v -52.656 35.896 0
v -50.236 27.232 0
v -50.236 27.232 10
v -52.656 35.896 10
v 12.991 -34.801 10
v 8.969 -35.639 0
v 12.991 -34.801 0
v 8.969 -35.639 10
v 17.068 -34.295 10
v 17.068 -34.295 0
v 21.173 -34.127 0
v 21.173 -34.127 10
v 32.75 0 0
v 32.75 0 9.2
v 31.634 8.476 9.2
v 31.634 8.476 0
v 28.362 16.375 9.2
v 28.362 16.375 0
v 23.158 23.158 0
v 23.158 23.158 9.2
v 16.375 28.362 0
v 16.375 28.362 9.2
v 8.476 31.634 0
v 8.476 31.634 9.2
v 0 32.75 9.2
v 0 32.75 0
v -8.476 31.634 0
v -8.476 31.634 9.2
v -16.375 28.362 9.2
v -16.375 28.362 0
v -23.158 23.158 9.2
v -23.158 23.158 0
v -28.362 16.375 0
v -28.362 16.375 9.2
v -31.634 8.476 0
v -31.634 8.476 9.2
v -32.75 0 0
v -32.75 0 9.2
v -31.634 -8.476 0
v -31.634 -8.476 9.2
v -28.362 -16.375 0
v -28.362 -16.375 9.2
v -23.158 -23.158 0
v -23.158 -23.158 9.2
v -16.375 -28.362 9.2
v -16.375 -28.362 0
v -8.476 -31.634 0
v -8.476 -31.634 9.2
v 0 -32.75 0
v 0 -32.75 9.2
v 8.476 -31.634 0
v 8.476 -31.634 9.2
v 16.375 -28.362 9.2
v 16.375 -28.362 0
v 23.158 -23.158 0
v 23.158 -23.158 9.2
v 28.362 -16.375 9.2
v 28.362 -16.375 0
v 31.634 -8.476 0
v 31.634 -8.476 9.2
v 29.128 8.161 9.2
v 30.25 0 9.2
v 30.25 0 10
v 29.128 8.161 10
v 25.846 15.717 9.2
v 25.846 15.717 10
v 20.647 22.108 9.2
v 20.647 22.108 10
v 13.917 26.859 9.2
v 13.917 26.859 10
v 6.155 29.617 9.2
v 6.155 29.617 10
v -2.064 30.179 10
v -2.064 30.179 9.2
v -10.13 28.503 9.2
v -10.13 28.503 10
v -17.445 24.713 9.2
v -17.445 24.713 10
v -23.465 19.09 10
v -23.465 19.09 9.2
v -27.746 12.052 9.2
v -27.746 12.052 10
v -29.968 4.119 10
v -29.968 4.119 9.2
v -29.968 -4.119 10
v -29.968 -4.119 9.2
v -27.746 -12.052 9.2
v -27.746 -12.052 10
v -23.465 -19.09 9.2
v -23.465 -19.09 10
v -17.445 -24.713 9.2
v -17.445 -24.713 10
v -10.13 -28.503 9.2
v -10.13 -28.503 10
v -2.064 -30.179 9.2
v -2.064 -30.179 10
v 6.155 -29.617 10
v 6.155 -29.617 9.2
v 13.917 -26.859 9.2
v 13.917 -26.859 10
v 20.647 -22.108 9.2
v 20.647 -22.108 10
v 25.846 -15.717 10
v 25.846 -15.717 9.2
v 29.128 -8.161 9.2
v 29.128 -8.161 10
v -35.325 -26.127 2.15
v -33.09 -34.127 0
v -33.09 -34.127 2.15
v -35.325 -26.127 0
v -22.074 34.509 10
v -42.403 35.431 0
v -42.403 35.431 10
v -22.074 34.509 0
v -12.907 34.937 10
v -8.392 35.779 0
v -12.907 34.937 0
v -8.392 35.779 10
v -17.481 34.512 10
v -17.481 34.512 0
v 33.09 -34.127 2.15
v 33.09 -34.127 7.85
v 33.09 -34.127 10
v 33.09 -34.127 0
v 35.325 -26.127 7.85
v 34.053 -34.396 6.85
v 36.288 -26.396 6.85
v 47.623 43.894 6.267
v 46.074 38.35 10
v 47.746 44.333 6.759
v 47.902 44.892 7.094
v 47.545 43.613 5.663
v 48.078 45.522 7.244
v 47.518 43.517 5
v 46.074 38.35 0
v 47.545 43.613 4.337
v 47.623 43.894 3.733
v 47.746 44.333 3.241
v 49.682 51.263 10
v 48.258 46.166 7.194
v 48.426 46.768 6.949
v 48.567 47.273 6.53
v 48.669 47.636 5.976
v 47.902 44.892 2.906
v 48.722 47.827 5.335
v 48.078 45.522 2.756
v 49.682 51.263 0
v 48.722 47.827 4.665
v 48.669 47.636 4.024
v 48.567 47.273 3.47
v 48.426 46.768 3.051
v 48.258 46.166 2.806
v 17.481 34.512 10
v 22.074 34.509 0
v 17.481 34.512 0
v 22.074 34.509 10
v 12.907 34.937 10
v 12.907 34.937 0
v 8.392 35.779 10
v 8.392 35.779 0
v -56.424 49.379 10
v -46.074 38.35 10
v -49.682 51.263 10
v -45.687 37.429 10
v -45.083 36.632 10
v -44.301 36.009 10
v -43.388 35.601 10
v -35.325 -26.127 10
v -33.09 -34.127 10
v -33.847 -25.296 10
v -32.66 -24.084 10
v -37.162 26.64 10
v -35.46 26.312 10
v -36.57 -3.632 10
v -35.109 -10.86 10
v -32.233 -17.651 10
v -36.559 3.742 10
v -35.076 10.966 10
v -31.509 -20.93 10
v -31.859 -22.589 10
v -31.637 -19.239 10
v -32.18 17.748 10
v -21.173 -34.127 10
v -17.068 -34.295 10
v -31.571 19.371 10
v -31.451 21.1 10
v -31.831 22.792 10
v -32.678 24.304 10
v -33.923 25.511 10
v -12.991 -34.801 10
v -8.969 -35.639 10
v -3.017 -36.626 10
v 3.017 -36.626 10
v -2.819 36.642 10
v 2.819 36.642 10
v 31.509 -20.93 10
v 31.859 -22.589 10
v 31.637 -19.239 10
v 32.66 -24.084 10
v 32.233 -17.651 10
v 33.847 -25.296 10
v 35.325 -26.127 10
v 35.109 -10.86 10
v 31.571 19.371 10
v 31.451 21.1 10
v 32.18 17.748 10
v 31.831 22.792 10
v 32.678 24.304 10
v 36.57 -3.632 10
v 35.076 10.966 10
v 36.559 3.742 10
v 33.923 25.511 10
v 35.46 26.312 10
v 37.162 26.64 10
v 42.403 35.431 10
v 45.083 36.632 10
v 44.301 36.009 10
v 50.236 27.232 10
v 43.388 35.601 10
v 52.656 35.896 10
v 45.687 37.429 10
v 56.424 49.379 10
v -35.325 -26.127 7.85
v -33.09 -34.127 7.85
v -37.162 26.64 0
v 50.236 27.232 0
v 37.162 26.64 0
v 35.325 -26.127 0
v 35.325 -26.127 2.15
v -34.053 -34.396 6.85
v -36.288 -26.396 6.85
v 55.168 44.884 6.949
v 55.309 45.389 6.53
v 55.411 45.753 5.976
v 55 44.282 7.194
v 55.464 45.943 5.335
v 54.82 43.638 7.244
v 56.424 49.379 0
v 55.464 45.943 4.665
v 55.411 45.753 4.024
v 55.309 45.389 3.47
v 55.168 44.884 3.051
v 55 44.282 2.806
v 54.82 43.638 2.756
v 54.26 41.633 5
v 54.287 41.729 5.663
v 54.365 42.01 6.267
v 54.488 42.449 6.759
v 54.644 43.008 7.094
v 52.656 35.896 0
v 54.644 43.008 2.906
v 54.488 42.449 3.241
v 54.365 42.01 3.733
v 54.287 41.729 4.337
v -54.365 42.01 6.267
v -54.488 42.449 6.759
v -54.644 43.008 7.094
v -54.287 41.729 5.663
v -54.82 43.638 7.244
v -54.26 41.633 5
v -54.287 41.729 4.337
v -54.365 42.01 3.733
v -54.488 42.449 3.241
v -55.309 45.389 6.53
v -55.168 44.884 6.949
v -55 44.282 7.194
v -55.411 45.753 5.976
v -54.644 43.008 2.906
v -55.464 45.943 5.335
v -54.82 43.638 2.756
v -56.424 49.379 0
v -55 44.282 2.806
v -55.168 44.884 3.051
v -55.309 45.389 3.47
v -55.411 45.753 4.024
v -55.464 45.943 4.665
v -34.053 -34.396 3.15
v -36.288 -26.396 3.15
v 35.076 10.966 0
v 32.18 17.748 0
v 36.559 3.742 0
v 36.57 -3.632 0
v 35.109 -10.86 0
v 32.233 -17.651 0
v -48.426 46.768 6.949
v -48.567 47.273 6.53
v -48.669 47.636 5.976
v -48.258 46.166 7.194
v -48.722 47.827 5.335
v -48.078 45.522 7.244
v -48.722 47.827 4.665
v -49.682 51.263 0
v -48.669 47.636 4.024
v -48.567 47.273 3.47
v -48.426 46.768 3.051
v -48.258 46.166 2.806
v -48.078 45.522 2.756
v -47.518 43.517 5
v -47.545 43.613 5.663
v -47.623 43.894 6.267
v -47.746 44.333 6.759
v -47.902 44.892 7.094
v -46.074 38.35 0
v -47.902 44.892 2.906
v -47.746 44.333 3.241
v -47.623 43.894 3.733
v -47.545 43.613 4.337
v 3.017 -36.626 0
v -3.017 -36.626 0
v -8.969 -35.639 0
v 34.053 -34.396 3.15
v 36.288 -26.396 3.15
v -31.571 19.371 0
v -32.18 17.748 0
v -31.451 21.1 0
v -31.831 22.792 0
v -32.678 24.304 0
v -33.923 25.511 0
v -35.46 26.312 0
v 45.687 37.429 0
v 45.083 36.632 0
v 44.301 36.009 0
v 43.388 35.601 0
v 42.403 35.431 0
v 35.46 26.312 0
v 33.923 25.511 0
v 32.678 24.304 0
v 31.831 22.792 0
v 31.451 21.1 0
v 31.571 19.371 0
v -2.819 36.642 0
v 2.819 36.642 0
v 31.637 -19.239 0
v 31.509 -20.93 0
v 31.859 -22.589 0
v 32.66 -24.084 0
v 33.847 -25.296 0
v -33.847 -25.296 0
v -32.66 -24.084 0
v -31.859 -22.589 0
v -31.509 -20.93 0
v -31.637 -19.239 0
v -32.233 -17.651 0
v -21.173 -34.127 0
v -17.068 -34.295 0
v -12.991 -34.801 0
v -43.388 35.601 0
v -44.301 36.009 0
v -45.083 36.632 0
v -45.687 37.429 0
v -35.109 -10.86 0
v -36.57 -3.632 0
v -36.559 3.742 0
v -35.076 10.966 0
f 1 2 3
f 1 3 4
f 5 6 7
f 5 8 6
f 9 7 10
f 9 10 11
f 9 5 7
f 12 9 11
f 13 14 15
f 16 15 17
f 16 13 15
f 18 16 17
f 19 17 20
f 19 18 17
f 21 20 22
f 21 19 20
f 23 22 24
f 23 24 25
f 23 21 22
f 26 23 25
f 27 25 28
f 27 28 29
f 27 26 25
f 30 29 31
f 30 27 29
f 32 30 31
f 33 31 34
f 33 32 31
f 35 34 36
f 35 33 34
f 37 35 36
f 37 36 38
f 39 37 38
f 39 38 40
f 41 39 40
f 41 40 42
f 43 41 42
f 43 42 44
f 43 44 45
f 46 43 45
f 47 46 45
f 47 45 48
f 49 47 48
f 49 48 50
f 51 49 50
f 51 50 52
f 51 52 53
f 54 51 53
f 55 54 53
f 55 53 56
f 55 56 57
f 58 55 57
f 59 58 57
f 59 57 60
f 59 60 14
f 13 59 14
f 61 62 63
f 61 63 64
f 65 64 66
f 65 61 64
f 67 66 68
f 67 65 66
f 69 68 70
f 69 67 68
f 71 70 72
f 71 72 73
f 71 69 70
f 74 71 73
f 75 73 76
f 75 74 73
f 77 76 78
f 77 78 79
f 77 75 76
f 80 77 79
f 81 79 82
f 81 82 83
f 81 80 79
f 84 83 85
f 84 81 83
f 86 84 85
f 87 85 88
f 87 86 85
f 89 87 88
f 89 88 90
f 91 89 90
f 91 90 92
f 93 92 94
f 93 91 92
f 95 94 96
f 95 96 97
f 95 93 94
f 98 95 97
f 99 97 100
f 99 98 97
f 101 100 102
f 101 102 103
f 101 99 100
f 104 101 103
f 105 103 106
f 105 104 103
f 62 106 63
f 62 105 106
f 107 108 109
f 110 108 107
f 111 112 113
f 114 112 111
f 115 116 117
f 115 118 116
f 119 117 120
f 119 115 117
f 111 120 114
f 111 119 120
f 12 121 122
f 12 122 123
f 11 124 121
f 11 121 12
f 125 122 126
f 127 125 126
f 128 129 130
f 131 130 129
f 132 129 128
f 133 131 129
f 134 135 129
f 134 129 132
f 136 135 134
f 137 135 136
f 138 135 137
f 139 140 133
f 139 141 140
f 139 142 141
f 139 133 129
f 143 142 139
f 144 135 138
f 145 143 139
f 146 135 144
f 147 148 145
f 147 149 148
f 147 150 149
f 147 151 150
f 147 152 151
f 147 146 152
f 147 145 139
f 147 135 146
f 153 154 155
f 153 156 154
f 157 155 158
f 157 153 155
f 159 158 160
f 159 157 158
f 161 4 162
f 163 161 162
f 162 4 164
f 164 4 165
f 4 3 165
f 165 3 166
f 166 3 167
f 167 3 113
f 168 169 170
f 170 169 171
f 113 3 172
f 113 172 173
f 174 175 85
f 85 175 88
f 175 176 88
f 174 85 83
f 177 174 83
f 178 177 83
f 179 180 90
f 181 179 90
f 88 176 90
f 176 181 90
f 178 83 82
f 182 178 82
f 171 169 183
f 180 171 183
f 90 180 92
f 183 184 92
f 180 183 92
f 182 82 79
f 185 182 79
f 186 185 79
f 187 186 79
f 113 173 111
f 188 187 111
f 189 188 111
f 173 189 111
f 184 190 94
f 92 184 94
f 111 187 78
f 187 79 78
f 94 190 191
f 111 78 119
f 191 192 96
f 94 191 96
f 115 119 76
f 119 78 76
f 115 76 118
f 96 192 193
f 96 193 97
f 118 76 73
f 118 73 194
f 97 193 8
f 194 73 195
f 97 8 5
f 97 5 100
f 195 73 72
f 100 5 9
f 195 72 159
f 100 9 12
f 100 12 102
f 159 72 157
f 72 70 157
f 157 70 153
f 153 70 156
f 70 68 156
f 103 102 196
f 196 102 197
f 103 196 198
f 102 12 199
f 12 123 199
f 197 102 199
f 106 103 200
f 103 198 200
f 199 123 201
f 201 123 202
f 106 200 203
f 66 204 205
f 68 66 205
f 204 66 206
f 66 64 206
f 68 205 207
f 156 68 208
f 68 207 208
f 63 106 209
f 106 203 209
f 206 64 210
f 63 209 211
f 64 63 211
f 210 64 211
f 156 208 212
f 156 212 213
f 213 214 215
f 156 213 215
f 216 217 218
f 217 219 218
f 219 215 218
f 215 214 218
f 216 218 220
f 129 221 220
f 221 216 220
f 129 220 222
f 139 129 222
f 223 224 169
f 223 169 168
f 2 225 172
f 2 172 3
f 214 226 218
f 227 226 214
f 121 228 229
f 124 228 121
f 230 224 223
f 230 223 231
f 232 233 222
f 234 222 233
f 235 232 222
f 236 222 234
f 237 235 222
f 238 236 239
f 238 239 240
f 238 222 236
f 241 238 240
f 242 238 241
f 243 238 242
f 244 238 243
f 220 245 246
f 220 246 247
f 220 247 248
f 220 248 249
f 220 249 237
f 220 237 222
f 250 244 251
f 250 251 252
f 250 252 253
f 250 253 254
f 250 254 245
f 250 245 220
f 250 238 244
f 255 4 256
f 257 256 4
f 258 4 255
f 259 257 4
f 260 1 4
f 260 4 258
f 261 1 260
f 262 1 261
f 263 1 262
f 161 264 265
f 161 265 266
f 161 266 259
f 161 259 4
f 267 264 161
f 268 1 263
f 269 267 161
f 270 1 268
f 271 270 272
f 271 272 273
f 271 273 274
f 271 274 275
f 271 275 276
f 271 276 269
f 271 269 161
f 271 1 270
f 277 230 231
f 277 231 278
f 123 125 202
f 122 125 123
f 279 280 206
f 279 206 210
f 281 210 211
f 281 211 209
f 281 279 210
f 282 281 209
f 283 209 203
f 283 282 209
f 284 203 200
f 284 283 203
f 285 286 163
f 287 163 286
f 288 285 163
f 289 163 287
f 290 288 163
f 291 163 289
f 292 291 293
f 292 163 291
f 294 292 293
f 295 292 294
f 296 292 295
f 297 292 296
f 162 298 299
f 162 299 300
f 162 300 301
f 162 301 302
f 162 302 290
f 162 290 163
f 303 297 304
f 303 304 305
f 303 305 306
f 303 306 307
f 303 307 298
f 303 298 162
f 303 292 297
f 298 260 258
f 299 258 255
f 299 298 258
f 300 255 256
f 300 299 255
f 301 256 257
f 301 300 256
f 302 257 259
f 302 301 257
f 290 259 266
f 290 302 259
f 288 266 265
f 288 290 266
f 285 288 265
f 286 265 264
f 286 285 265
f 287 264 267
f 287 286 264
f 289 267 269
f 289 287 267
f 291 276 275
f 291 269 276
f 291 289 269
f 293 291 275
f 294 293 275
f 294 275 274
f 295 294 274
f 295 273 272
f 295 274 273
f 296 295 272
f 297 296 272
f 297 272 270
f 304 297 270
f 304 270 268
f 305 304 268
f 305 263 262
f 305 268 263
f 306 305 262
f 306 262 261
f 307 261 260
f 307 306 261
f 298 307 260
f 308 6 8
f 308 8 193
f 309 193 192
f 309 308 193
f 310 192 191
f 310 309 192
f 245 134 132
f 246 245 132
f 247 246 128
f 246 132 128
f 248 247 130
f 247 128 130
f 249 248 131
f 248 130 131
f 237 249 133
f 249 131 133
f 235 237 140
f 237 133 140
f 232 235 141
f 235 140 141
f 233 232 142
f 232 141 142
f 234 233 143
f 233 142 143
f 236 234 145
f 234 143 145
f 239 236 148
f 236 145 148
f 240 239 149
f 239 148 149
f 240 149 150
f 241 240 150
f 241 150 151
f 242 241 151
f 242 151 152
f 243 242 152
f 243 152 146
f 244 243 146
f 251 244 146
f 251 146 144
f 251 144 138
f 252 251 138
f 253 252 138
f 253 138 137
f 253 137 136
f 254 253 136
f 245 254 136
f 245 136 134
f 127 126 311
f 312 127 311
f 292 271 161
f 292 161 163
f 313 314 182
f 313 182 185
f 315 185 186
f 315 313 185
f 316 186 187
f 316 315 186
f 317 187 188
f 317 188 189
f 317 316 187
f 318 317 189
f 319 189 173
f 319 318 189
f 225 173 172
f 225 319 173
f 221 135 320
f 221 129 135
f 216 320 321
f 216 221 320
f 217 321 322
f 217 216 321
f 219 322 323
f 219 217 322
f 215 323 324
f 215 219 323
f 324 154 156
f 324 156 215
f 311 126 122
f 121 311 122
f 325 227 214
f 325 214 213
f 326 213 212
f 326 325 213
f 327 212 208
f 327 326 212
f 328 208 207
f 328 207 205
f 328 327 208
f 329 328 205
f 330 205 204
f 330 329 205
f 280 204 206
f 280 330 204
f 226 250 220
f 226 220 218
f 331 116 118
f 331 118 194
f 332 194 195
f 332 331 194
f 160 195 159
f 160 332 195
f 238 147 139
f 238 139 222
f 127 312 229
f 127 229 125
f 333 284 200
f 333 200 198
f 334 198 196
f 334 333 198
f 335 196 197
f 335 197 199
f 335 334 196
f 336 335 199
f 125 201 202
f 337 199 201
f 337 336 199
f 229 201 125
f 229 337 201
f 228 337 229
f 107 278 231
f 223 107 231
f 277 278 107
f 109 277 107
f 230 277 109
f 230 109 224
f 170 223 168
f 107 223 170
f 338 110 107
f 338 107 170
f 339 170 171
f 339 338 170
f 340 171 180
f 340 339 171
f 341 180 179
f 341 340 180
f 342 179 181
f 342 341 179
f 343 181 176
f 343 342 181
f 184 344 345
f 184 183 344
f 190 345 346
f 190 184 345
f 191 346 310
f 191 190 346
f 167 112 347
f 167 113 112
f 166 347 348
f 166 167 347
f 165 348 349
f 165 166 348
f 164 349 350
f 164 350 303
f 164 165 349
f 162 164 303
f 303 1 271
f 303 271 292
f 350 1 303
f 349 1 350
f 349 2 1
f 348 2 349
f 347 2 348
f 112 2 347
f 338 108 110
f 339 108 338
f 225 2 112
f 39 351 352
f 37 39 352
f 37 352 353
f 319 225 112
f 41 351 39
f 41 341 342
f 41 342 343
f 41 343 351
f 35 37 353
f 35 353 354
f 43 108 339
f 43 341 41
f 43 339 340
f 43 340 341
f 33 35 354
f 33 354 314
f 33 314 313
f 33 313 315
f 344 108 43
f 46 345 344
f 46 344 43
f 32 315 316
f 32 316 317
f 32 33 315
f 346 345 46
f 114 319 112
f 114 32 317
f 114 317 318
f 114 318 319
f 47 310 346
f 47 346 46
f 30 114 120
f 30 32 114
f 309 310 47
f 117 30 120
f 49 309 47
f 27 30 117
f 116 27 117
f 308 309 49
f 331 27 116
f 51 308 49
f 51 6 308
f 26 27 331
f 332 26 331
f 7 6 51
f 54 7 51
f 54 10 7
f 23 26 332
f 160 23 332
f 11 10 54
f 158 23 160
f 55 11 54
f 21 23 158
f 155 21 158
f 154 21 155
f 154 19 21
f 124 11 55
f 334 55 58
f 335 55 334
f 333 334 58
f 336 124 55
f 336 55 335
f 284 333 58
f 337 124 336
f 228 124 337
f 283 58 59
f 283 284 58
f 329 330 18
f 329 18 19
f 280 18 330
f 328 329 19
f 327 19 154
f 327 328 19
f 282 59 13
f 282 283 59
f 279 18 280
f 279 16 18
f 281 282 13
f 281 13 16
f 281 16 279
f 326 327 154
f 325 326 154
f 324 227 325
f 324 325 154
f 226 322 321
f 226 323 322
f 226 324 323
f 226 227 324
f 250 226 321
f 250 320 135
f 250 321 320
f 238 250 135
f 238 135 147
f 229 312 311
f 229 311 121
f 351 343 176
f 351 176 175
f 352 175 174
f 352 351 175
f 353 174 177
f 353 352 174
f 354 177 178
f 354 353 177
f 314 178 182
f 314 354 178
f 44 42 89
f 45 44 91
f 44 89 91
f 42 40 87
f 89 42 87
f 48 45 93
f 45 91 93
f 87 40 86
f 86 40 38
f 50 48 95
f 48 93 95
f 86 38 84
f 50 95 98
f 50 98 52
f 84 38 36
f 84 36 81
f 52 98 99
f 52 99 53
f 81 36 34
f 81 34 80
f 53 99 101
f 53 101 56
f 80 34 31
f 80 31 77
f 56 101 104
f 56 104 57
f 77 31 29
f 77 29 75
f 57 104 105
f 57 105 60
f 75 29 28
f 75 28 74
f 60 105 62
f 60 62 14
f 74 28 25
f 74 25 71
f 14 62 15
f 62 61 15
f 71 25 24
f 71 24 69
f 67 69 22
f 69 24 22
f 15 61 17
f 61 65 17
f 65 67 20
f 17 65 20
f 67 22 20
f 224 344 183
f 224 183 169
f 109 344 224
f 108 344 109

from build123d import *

# Parameters (mm, degrees)
SKIZZE1_R                       = 32.75
AUFSATZ_LINEAR_AUSTRAGEN1_DEPTH = 10
AUFSATZ_LINEAR_START            = -0.8
SKIZZE2_R                       = 32.75
SKIZZE2_R_2                     = 30.25
AUFSATZ_LINEAR_AUSTRAGEN2_DEPTH = 0.8
SKIZZE5_R                       = 2.25
SCHNITT_LINEAR_AUSTRAGEN1_DEPTH = 10
VERRUNDUNG1_R                   = 50
VERRUNDUNG2_R                   = 6
VERRUNDUNG3_R                   = 4
AUFSATZ_LINEAR_AUSTRAGEN3_DEPTH = 8.306468


with BuildPart() as part:
    # Skizze1 → Aufsatz-Linear austragen1 (new body)
    with BuildSketch(Plane.XY):
        with BuildLine():
            Line((-13.635878322, -34.12660725), (-33.089645956, -34.12660725))
            Line((-33.089645956, -34.12660725), (-35.325135331, -26.12660725))
            Line((-35.325135331, -26.12660725), (-25.844978112, -26.12660725))
            ThreePointArc((-25.844978112, -26.12660725), (-36.75, 0), (-25.844978112, 26.12660725))
            Line((-25.844978112, 26.12660725), (-50.235580292, 27.232429468))
            Line((-50.235580292, 27.232429468), (-52.656417654, 35.895722216))
            Line((-52.656417654, 35.895722216), (-56.424186432, 49.379190555))
            Line((-56.424186432, 49.379190555), (-49.682452262, 51.263074944))
            Line((-49.682452262, 51.263074944), (-45.294995525, 35.561969729))
            Line((-45.294995525, 35.561969729), (-13.635878322, 34.12660725))
            ThreePointArc((-13.635878322, 34.12660725), (0, 36.75), (13.635878322, 34.12660725))
            Line((13.635878322, 34.12660725), (45.294995525, 35.561969729))
            Line((45.294995525, 35.561969729), (49.682452262, 51.263074944))
            Line((49.682452262, 51.263074944), (56.424186432, 49.379190555))
            Line((56.424186432, 49.379190555), (52.656417654, 35.895722216))
            Line((52.656417654, 35.895722216), (50.235580292, 27.232429468))
            Line((50.235580292, 27.232429468), (25.844978112, 26.12660725))
            ThreePointArc((25.844978112, 26.12660725), (36.75, 0), (25.844978112, -26.12660725))
            Line((25.844978112, -26.12660725), (35.325135331, -26.12660725))
            Line((35.325135331, -26.12660725), (33.089645956, -34.12660725))
            Line((33.089645956, -34.12660725), (13.635878322, -34.12660725))
            ThreePointArc((13.635878322, -34.12660725), (0, -36.75), (-13.635878322, -34.12660725))
        make_face()
        Circle(SKIZZE1_R, mode=Mode.SUBTRACT)
    extrude(amount=AUFSATZ_LINEAR_AUSTRAGEN1_DEPTH)

    # Skizze2 → Aufsatz-Linear austragen2 (add)
    with BuildSketch(Plane.XY.offset(10).offset(AUFSATZ_LINEAR_START)):
        Circle(SKIZZE2_R)
        Circle(SKIZZE2_R_2, mode=Mode.SUBTRACT)
    extrude(amount=AUFSATZ_LINEAR_AUSTRAGEN2_DEPTH)

    # Skizze5 → Schnitt-Linear austragen1 (cut)
    with BuildSketch(Plane(origin=(32.796772797, -9.164604643, 0), x_dir=(0, 0, 1), z_dir=(-0.9631048813334842, 0.2691263412444341, 0))):
        with Locations(Location((5, 56.94978804, 0), (0, 0, 270))):
            Circle(SKIZZE5_R)
    schnitt_linear_austragen1 = extrude(amount=-SCHNITT_LINEAR_AUSTRAGEN1_DEPTH, mode=Mode.SUBTRACT)

    # Spiegeln1: Schnitt-Linear austragen1 across plane
    add(schnitt_linear_austragen1.mirror(Plane(origin=(0, 0, 0), x_dir=(0, 0, 1), z_dir=(1, 0, 0))), mode=Mode.SUBTRACT)

    # Verrundung1
    verrundung1_edges = [part.edges().sort_by_distance(p)[0] for p in [
        (13.635878322, 34.12660725, 5),
        (13.635878322, -34.12660725, 5),
        (-13.635878322, -34.12660725, 5),
        (-13.635878322, 34.12660725, 5),
    ]]
    fillet(verrundung1_edges, radius=VERRUNDUNG1_R)

    # Verrundung2
    # the kernel refuses this fillet: 6 mm, written as the material it adds along each edge
    with BuildSketch(Plane(origin=(-25.844978112, -26.12660725, 0), x_dir=(-1, 0, 0), z_dir=(0, 0, 1))) as verrundung2_piece_1:
        with BuildLine():
            CenterArc((11.651069987, -5.593490659), VERRUNDUNG2_R, 111.211936516, 97.493506366)
            Line((6.388466745, -8.475331584), (6.283214681, -8.532968403))
            ThreePointArc((6.283214681, -8.532968403), (3.405977683, -4.078058883), (-0.084391765, -0.085311371))
            Line((-0.084391765, -0.085311371), (0, 0.12))
            ThreePointArc((0, 0.12), (4.74007861, 0.12), (9.436738964, 0.111869813))
            Line((9.436738964, 0.111869813), (9.48015722, 0))
        make_face()
    extrude(amount=10)
    with BuildSketch(Plane(origin=(25.844978112, -26.12660725, 0), x_dir=(1, 0, 0), z_dir=(0, 0, 1))) as verrundung2_piece_2:
        with BuildLine():
            CenterArc((11.651069987, 5.593490659), VERRUNDUNG2_R, 151.294557118, 97.493506366)
            Line((6.388466745, 8.475331584), (6.283214681, 8.532968403))
            ThreePointArc((6.283214681, 8.532968403), (3.405977683, 4.078058883), (-0.084391765, 0.085311371))
            Line((-0.084391765, 0.085311371), (0, -0.12))
            ThreePointArc((0, -0.12), (4.74007861, -0.12), (9.436738964, -0.111869813))
            Line((9.436738964, -0.111869813), (9.48015722, 0))
        make_face()
    extrude(amount=10)
    with BuildSketch(Plane(origin=(25.844978112, 26.12660725, 0), x_dir=(0.603126946859045, -0.7976452130944475, 0), z_dir=(0, 0, 1))) as verrundung2_piece_3:
        with BuildLine():
            CenterArc((11.361383868, 5.938413704), VERRUNDUNG2_R, 145.501722428, 116.281978681)
            Line((6.416524574, 9.336702474), (6.317627388, 9.40466825))
            Line((6.317627388, 9.40466825), (-0.098897186, 0.067965775))
            Line((-0.098897186, 0.067965775), (0.017149259, -0.118768274))
            ThreePointArc((0.017149259, -0.118768274), (5.251960467, 0.257216064), (10.486771676, -0.118768274))
            Line((10.486771676, -0.118768274), (10.503920934, 0))
        make_face()
    extrude(amount=10)
    with BuildSketch(Plane(origin=(-25.844978112, 26.12660725, 0), x_dir=(-0.6031269468590452, -0.7976452130944475, 0), z_dir=(0, 0, 1))) as verrundung2_piece_4:
        with BuildLine():
            CenterArc((11.361383868, -5.938413704), VERRUNDUNG2_R, 98.216298891, 116.281978681)
            Line((6.416524574, -9.336702474), (6.317627388, -9.40466825))
            Line((6.317627388, -9.40466825), (-0.098897186, -0.067965775))
            Line((-0.098897186, -0.067965775), (0.017149259, 0.118768274))
            ThreePointArc((0.017149259, 0.118768274), (5.251960467, -0.257216064), (10.486771676, 0.118768274))
            Line((10.486771676, 0.118768274), (10.503920934, 0))
        make_face()
    extrude(amount=10)

    # Verrundung3
    verrundung3_edges = [part.edges().sort_by_distance(p)[0] for p in [
        (45.294995525, 35.561969729, 5),
        (-45.294995525, 35.561969729, 5),
    ]]
    fillet(verrundung3_edges, radius=VERRUNDUNG3_R)

    # Skizze6 → Aufsatz-Linear austragen3 (add)
    with BuildSketch(Plane(origin=(6.448861011, -23.078118218, 0), x_dir=(0, 0, -1), z_dir=(-0.26912634124443396, 0.9631048813334842, 0))):
        Polygon((-7.85, 41.05316849), (-6.85, 42.05316849), (-3.15, 42.05316849), (-2.15, 41.05316849), align=None)
    aufsatz_linear_austragen3 = extrude(amount=AUFSATZ_LINEAR_AUSTRAGEN3_DEPTH)

    # Spiegeln2: Aufsatz-Linear austragen3 across plane
    add(aufsatz_linear_austragen3.mirror(Plane(origin=(0, 0, 0), x_dir=(0, 0, 1), z_dir=(1, 0, 0))))


solid = part.part
